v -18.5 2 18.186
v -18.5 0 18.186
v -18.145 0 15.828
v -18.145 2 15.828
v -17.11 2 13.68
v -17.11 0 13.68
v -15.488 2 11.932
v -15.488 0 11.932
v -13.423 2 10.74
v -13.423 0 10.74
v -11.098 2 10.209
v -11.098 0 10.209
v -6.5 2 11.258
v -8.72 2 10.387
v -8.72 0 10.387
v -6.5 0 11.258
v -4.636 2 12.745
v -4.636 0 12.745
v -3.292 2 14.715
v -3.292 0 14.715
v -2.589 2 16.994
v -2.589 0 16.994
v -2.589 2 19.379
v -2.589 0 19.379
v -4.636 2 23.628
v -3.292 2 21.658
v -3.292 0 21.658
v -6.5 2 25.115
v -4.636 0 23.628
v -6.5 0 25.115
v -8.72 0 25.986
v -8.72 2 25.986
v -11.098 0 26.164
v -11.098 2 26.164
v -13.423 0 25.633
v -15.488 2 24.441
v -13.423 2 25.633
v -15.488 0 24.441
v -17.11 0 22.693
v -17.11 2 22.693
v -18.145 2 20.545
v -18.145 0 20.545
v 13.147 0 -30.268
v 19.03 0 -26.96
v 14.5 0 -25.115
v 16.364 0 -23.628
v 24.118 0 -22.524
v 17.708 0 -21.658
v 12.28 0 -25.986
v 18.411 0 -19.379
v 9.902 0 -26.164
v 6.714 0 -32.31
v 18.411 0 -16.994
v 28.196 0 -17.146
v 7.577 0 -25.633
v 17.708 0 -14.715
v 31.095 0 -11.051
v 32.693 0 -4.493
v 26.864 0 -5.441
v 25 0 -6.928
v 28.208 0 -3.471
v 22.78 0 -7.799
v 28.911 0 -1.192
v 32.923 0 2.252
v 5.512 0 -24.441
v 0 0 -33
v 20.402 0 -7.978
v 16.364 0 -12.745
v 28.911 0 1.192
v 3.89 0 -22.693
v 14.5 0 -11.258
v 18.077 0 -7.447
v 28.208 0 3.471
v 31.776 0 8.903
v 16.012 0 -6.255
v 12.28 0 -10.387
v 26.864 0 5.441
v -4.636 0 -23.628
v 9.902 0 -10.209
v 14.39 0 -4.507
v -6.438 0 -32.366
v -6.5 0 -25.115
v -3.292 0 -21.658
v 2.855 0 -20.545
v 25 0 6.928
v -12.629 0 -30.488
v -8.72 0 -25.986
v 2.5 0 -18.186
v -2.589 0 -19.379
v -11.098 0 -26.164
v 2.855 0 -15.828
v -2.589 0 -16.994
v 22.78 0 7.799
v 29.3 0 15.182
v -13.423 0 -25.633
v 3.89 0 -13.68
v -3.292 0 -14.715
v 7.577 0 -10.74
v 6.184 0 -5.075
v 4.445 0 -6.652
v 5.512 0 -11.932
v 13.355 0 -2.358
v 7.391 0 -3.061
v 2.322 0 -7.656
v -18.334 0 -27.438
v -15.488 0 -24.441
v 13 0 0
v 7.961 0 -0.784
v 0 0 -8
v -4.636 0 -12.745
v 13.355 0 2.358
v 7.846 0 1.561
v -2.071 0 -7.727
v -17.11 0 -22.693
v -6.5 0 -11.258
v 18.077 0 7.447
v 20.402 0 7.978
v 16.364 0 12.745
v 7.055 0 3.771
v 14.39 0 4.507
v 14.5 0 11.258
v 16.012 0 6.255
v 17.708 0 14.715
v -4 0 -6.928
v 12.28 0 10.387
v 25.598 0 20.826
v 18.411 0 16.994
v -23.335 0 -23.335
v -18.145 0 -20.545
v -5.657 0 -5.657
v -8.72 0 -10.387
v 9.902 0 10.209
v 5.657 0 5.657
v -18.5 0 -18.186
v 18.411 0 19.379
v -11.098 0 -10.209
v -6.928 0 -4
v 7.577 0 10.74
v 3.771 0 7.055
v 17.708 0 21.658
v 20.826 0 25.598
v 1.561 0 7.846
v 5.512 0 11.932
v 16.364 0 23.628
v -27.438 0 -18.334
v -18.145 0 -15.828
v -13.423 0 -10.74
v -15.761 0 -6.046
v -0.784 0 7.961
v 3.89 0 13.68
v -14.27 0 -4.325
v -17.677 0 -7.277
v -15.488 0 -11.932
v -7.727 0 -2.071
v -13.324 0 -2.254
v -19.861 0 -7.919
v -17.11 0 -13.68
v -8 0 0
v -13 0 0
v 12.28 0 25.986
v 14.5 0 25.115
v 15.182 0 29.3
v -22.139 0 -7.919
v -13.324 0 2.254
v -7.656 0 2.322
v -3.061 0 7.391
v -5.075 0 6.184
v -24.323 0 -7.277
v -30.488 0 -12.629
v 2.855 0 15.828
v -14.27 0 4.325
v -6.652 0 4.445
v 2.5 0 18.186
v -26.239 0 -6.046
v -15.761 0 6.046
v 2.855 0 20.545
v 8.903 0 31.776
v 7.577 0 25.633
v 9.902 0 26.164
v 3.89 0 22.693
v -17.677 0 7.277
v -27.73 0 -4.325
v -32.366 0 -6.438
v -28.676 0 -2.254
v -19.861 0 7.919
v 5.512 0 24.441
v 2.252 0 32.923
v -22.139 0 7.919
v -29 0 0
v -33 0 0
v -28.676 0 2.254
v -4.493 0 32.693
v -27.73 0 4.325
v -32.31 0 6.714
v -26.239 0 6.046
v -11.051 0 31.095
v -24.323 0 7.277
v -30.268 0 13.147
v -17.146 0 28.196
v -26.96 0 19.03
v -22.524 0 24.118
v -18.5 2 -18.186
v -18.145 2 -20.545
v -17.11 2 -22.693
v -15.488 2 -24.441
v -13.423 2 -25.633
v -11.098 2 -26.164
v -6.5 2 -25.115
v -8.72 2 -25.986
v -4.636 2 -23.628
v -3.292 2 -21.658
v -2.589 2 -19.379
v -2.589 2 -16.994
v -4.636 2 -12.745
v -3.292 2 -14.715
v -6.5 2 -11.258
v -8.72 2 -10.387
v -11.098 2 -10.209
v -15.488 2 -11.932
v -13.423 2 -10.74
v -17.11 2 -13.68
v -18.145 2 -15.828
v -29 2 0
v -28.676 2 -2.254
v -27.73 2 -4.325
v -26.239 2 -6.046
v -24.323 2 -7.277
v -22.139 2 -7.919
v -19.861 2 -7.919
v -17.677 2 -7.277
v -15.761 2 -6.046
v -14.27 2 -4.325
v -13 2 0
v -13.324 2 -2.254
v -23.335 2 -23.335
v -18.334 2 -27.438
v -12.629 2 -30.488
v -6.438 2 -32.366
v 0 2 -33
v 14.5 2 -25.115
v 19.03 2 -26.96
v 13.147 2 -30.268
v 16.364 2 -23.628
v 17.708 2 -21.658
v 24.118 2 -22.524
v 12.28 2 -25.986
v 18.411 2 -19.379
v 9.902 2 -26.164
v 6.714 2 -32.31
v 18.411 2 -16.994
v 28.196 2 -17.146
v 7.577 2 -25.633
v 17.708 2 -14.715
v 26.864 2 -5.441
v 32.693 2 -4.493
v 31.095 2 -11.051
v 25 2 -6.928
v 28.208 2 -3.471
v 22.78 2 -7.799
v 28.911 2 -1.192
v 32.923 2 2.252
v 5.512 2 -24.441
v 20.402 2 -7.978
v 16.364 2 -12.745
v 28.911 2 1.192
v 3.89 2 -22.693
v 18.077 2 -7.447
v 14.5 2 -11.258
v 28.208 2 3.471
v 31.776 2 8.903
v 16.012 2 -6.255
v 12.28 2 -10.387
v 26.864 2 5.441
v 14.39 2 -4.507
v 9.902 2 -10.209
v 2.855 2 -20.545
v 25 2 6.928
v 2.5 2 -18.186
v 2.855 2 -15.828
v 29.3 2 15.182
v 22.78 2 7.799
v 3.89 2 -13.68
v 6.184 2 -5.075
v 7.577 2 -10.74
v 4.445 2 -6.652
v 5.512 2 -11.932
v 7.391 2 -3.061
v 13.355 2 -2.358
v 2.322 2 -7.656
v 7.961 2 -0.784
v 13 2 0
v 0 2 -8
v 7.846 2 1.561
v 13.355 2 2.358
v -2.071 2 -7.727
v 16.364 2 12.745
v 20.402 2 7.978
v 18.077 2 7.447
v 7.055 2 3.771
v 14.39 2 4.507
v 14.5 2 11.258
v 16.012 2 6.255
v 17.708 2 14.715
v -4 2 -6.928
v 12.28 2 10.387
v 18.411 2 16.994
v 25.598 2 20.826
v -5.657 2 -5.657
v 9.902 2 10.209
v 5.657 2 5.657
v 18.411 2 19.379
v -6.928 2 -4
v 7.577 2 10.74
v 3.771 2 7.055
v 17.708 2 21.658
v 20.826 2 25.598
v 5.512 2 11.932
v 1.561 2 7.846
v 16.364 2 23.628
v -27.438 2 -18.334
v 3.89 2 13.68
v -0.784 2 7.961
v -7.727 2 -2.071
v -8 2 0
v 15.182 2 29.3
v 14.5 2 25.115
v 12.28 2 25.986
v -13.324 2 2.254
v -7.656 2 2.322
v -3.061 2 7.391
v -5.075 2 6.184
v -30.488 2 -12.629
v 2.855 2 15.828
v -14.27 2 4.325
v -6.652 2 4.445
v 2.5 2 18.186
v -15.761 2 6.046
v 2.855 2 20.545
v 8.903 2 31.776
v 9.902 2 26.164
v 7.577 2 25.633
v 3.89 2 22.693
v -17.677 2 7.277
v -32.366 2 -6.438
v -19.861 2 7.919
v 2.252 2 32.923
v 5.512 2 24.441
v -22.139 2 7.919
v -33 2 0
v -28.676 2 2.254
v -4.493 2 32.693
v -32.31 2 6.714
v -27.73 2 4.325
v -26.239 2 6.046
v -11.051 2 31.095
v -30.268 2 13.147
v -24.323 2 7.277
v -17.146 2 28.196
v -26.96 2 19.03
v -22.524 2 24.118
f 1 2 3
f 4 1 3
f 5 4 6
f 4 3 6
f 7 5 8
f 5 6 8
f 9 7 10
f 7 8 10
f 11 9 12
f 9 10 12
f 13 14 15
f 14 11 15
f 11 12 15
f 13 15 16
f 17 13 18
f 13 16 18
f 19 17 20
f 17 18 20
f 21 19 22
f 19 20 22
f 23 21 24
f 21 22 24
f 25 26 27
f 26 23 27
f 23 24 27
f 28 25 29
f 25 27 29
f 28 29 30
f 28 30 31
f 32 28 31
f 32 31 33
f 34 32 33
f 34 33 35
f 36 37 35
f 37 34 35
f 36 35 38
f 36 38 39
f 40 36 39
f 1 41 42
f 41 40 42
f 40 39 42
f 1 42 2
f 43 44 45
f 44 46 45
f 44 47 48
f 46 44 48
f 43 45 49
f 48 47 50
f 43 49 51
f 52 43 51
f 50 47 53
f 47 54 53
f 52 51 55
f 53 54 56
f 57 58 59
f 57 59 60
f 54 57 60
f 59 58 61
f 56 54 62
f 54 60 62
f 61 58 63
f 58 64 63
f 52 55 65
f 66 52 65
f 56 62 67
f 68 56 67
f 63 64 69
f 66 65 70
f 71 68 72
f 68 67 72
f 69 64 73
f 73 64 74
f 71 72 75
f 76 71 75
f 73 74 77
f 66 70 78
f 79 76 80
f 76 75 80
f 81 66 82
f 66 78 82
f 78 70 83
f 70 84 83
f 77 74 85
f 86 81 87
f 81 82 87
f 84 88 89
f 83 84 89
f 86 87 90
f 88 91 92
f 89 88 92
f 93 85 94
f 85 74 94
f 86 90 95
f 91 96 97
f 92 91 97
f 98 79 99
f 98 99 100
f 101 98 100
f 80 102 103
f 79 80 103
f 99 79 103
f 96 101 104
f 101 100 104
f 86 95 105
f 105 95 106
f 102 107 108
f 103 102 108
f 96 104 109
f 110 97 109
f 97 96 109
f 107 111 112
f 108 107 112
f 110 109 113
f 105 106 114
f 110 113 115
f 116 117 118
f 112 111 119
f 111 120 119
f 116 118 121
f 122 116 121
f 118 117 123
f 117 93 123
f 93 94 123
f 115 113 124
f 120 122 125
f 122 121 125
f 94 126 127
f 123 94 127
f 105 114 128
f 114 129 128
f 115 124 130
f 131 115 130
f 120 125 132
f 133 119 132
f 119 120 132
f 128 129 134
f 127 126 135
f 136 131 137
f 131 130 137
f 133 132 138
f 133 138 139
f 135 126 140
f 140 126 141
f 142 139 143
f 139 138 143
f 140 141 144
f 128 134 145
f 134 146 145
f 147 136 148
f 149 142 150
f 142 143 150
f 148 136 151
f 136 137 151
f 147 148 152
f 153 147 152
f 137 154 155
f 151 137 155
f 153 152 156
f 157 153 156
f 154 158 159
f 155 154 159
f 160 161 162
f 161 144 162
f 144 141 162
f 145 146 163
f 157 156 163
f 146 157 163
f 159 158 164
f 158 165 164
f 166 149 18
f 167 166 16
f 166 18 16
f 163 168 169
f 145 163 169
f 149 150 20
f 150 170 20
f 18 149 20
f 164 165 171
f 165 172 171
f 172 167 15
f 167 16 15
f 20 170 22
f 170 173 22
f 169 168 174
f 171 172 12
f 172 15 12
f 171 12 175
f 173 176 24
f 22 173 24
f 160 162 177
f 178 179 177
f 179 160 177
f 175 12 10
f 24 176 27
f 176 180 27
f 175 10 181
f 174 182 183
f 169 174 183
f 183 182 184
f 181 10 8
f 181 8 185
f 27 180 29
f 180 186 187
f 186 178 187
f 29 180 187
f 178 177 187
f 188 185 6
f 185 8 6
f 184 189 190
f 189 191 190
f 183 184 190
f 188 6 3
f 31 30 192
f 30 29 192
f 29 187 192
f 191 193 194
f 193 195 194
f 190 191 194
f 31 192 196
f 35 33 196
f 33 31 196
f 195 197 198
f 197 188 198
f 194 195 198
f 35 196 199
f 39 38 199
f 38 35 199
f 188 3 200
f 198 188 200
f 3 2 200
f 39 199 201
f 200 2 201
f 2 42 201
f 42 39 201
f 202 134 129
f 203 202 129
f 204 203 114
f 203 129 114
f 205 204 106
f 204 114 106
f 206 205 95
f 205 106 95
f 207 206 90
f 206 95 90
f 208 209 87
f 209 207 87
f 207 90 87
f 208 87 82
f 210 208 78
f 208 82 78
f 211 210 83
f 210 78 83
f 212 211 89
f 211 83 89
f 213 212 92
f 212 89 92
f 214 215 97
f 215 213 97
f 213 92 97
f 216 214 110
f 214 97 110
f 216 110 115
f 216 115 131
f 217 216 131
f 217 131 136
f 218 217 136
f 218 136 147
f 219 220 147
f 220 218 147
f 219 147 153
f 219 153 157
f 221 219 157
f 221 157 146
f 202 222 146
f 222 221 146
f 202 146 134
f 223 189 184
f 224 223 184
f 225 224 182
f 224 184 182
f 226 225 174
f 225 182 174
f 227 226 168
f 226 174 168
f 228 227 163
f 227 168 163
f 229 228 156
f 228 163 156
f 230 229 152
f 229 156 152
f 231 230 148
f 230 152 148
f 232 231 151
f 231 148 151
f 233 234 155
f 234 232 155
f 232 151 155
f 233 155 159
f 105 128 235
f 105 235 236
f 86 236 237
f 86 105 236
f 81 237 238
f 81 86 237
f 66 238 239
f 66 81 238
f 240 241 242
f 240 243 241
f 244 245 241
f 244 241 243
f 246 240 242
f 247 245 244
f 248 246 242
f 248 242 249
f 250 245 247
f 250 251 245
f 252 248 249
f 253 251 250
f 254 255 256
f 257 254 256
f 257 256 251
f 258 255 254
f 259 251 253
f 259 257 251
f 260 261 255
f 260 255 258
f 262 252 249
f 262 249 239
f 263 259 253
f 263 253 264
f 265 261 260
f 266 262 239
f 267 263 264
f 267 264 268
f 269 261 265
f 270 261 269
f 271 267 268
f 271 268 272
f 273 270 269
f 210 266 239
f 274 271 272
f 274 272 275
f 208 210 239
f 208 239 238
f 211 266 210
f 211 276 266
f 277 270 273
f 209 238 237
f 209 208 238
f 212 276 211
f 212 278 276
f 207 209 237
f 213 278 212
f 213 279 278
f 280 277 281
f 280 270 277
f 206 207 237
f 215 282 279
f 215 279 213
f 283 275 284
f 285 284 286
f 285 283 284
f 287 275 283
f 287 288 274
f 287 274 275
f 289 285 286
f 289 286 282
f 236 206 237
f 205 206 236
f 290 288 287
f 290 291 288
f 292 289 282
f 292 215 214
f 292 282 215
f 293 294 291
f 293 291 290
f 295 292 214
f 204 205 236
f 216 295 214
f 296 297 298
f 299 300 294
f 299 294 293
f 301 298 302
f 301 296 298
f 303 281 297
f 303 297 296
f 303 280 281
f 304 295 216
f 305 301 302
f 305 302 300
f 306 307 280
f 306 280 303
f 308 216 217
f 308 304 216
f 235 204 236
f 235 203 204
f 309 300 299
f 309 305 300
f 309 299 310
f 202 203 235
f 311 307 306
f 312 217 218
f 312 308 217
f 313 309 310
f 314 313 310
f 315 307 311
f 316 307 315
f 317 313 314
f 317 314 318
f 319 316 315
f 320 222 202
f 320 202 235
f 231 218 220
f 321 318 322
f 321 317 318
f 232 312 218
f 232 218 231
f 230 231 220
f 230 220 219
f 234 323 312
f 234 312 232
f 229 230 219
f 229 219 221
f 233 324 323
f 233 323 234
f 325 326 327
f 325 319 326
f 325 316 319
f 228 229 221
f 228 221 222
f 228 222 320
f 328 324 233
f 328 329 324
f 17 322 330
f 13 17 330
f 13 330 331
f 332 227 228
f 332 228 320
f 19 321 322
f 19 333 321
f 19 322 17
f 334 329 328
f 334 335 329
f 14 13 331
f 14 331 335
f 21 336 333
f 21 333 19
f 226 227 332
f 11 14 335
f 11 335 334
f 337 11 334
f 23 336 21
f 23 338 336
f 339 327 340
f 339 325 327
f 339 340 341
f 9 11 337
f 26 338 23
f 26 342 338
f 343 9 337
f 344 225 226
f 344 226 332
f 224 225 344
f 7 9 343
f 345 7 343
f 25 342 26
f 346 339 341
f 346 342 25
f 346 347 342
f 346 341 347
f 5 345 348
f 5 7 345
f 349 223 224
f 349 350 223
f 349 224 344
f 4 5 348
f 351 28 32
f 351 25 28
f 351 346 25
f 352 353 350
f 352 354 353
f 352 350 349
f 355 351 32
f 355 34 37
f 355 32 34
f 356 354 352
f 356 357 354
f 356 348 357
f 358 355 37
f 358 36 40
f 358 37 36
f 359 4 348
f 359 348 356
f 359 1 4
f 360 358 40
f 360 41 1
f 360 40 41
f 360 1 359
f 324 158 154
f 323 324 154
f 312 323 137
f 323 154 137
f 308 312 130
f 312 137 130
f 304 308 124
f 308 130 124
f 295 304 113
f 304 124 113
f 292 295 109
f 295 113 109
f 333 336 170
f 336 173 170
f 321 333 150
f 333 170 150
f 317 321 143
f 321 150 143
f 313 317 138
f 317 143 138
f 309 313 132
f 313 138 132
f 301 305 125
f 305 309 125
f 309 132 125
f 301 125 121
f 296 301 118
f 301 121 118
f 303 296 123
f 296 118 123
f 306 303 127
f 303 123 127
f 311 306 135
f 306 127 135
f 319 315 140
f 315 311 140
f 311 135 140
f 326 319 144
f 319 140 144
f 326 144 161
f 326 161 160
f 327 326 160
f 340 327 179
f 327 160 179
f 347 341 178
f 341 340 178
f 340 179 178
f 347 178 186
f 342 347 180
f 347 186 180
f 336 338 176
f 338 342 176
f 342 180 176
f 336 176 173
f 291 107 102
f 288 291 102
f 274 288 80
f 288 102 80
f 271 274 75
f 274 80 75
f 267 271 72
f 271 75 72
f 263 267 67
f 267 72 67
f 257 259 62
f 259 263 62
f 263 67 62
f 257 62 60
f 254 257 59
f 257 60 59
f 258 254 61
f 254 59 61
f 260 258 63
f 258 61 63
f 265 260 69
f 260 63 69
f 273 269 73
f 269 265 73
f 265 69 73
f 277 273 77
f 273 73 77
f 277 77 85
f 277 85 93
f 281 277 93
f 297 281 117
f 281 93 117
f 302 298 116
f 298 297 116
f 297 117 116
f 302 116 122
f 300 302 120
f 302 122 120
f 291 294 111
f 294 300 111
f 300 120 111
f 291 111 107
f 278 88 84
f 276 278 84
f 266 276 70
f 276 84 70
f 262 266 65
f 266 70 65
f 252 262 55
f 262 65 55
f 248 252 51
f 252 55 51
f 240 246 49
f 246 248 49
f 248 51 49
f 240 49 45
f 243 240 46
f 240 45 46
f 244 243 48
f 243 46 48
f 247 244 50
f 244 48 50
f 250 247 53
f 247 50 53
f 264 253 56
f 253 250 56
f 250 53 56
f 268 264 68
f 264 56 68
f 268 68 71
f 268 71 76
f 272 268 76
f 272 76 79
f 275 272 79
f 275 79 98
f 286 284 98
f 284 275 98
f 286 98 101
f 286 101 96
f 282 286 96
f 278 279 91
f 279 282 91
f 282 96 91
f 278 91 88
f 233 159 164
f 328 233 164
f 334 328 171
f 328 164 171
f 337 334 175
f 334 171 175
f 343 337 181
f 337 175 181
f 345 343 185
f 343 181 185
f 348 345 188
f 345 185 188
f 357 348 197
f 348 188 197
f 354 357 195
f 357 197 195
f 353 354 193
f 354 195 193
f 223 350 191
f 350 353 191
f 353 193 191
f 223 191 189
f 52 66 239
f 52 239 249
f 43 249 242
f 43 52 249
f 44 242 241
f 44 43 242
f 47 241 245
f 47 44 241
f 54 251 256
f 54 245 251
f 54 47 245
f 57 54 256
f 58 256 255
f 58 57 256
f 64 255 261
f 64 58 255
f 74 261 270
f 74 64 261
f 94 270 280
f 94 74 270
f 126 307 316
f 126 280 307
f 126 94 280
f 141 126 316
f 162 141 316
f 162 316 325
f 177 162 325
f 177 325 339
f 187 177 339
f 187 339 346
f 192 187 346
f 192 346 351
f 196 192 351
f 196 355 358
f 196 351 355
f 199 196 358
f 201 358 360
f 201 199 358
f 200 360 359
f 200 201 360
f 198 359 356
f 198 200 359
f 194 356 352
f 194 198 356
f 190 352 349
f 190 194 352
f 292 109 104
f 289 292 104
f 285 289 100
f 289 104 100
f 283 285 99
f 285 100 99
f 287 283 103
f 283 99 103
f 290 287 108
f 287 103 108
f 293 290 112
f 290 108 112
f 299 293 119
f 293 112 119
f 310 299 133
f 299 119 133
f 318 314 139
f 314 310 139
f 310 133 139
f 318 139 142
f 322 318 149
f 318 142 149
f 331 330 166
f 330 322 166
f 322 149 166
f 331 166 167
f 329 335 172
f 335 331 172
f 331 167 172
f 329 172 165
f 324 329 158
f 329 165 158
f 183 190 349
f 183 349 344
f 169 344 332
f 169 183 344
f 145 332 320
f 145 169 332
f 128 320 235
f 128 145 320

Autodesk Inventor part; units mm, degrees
ref_plane "YZ Plane" through (0, 0, 0) normal (1, 0, 0) x (0, 1, 0)
ref_plane "XZ Plane" through (0, 0, 0) normal (0, 1, 0) x (-1, 0, 0)
ref_plane "XY Plane" through (0, 0, 0) normal (0, 0, 1) x (1, 0, 0)
sketch "Sketch3" plane through (0, 0, 0) normal (0, 1, 0) x (-1, 0, 0)
  circle A0 centre (0, 0) radius 33
  circle A1 centre (0, 0) radius 8
  line L0 (0, 0) -> (32, 0) construction
  line L1 (0, 0) -> (34, 0) construction
  line L2 (24.0416, -24.0416) -> (20.5061, -20.5061)
  line L3 (0, 0) -> (34, 0) construction
  line L4 (0, 0) -> (22.2739, 0)
  line L5 (0, 0) -> (21, 0)
  circle A2 centre (21, 0) radius 8
  circle A3 centre (10.5, 18.1865) radius 8
  circle A4 centre (-10.5, 18.1865) radius 8
  circle A5 centre (-21, 0) radius 8
  circle A6 centre (-10.5, -18.1865) radius 8
  circle A7 centre (10.5, -18.1865) radius 8
  line L6 (0, 0) -> (0, -34)
  dimension "d15" = 66
  dimension "d17" = 16
  dimension "d25" = 34
  dimension "d27" = 5
  dimension "d31" = 21
  dimension "d32" = 16
  dimension "d35" = 360
  dimension "d39" = 34
extrude "Extrusion1" add sketch "Sketch3" along normal blind 2
properties part number "separator"
